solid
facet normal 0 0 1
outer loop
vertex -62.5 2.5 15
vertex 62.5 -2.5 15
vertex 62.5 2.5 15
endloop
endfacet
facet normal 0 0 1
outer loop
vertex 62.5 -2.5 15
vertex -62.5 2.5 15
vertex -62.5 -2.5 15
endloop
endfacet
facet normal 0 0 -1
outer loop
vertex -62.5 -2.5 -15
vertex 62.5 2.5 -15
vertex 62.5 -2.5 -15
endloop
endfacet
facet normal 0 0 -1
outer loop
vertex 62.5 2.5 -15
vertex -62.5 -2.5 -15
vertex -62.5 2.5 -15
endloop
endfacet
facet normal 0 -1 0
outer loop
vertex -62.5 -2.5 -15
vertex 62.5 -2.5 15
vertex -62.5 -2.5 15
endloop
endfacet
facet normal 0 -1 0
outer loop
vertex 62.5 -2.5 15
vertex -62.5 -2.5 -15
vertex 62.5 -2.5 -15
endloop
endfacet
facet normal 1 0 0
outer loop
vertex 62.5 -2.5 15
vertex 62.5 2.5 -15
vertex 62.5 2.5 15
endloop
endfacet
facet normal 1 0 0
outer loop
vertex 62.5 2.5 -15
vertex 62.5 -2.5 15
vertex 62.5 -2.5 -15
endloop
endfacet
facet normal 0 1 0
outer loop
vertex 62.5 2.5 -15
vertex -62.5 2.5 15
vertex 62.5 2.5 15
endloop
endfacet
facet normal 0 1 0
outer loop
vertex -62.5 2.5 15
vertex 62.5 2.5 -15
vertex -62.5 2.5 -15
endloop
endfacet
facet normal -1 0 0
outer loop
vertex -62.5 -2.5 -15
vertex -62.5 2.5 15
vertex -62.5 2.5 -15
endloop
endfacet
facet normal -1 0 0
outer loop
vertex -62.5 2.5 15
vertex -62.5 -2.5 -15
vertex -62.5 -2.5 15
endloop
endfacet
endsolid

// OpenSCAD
bracket_width = 125;
bracket_height = 30;
wall_thickness = 5;

cube([bracket_width, wall_thickness, bracket_height], center = true);
